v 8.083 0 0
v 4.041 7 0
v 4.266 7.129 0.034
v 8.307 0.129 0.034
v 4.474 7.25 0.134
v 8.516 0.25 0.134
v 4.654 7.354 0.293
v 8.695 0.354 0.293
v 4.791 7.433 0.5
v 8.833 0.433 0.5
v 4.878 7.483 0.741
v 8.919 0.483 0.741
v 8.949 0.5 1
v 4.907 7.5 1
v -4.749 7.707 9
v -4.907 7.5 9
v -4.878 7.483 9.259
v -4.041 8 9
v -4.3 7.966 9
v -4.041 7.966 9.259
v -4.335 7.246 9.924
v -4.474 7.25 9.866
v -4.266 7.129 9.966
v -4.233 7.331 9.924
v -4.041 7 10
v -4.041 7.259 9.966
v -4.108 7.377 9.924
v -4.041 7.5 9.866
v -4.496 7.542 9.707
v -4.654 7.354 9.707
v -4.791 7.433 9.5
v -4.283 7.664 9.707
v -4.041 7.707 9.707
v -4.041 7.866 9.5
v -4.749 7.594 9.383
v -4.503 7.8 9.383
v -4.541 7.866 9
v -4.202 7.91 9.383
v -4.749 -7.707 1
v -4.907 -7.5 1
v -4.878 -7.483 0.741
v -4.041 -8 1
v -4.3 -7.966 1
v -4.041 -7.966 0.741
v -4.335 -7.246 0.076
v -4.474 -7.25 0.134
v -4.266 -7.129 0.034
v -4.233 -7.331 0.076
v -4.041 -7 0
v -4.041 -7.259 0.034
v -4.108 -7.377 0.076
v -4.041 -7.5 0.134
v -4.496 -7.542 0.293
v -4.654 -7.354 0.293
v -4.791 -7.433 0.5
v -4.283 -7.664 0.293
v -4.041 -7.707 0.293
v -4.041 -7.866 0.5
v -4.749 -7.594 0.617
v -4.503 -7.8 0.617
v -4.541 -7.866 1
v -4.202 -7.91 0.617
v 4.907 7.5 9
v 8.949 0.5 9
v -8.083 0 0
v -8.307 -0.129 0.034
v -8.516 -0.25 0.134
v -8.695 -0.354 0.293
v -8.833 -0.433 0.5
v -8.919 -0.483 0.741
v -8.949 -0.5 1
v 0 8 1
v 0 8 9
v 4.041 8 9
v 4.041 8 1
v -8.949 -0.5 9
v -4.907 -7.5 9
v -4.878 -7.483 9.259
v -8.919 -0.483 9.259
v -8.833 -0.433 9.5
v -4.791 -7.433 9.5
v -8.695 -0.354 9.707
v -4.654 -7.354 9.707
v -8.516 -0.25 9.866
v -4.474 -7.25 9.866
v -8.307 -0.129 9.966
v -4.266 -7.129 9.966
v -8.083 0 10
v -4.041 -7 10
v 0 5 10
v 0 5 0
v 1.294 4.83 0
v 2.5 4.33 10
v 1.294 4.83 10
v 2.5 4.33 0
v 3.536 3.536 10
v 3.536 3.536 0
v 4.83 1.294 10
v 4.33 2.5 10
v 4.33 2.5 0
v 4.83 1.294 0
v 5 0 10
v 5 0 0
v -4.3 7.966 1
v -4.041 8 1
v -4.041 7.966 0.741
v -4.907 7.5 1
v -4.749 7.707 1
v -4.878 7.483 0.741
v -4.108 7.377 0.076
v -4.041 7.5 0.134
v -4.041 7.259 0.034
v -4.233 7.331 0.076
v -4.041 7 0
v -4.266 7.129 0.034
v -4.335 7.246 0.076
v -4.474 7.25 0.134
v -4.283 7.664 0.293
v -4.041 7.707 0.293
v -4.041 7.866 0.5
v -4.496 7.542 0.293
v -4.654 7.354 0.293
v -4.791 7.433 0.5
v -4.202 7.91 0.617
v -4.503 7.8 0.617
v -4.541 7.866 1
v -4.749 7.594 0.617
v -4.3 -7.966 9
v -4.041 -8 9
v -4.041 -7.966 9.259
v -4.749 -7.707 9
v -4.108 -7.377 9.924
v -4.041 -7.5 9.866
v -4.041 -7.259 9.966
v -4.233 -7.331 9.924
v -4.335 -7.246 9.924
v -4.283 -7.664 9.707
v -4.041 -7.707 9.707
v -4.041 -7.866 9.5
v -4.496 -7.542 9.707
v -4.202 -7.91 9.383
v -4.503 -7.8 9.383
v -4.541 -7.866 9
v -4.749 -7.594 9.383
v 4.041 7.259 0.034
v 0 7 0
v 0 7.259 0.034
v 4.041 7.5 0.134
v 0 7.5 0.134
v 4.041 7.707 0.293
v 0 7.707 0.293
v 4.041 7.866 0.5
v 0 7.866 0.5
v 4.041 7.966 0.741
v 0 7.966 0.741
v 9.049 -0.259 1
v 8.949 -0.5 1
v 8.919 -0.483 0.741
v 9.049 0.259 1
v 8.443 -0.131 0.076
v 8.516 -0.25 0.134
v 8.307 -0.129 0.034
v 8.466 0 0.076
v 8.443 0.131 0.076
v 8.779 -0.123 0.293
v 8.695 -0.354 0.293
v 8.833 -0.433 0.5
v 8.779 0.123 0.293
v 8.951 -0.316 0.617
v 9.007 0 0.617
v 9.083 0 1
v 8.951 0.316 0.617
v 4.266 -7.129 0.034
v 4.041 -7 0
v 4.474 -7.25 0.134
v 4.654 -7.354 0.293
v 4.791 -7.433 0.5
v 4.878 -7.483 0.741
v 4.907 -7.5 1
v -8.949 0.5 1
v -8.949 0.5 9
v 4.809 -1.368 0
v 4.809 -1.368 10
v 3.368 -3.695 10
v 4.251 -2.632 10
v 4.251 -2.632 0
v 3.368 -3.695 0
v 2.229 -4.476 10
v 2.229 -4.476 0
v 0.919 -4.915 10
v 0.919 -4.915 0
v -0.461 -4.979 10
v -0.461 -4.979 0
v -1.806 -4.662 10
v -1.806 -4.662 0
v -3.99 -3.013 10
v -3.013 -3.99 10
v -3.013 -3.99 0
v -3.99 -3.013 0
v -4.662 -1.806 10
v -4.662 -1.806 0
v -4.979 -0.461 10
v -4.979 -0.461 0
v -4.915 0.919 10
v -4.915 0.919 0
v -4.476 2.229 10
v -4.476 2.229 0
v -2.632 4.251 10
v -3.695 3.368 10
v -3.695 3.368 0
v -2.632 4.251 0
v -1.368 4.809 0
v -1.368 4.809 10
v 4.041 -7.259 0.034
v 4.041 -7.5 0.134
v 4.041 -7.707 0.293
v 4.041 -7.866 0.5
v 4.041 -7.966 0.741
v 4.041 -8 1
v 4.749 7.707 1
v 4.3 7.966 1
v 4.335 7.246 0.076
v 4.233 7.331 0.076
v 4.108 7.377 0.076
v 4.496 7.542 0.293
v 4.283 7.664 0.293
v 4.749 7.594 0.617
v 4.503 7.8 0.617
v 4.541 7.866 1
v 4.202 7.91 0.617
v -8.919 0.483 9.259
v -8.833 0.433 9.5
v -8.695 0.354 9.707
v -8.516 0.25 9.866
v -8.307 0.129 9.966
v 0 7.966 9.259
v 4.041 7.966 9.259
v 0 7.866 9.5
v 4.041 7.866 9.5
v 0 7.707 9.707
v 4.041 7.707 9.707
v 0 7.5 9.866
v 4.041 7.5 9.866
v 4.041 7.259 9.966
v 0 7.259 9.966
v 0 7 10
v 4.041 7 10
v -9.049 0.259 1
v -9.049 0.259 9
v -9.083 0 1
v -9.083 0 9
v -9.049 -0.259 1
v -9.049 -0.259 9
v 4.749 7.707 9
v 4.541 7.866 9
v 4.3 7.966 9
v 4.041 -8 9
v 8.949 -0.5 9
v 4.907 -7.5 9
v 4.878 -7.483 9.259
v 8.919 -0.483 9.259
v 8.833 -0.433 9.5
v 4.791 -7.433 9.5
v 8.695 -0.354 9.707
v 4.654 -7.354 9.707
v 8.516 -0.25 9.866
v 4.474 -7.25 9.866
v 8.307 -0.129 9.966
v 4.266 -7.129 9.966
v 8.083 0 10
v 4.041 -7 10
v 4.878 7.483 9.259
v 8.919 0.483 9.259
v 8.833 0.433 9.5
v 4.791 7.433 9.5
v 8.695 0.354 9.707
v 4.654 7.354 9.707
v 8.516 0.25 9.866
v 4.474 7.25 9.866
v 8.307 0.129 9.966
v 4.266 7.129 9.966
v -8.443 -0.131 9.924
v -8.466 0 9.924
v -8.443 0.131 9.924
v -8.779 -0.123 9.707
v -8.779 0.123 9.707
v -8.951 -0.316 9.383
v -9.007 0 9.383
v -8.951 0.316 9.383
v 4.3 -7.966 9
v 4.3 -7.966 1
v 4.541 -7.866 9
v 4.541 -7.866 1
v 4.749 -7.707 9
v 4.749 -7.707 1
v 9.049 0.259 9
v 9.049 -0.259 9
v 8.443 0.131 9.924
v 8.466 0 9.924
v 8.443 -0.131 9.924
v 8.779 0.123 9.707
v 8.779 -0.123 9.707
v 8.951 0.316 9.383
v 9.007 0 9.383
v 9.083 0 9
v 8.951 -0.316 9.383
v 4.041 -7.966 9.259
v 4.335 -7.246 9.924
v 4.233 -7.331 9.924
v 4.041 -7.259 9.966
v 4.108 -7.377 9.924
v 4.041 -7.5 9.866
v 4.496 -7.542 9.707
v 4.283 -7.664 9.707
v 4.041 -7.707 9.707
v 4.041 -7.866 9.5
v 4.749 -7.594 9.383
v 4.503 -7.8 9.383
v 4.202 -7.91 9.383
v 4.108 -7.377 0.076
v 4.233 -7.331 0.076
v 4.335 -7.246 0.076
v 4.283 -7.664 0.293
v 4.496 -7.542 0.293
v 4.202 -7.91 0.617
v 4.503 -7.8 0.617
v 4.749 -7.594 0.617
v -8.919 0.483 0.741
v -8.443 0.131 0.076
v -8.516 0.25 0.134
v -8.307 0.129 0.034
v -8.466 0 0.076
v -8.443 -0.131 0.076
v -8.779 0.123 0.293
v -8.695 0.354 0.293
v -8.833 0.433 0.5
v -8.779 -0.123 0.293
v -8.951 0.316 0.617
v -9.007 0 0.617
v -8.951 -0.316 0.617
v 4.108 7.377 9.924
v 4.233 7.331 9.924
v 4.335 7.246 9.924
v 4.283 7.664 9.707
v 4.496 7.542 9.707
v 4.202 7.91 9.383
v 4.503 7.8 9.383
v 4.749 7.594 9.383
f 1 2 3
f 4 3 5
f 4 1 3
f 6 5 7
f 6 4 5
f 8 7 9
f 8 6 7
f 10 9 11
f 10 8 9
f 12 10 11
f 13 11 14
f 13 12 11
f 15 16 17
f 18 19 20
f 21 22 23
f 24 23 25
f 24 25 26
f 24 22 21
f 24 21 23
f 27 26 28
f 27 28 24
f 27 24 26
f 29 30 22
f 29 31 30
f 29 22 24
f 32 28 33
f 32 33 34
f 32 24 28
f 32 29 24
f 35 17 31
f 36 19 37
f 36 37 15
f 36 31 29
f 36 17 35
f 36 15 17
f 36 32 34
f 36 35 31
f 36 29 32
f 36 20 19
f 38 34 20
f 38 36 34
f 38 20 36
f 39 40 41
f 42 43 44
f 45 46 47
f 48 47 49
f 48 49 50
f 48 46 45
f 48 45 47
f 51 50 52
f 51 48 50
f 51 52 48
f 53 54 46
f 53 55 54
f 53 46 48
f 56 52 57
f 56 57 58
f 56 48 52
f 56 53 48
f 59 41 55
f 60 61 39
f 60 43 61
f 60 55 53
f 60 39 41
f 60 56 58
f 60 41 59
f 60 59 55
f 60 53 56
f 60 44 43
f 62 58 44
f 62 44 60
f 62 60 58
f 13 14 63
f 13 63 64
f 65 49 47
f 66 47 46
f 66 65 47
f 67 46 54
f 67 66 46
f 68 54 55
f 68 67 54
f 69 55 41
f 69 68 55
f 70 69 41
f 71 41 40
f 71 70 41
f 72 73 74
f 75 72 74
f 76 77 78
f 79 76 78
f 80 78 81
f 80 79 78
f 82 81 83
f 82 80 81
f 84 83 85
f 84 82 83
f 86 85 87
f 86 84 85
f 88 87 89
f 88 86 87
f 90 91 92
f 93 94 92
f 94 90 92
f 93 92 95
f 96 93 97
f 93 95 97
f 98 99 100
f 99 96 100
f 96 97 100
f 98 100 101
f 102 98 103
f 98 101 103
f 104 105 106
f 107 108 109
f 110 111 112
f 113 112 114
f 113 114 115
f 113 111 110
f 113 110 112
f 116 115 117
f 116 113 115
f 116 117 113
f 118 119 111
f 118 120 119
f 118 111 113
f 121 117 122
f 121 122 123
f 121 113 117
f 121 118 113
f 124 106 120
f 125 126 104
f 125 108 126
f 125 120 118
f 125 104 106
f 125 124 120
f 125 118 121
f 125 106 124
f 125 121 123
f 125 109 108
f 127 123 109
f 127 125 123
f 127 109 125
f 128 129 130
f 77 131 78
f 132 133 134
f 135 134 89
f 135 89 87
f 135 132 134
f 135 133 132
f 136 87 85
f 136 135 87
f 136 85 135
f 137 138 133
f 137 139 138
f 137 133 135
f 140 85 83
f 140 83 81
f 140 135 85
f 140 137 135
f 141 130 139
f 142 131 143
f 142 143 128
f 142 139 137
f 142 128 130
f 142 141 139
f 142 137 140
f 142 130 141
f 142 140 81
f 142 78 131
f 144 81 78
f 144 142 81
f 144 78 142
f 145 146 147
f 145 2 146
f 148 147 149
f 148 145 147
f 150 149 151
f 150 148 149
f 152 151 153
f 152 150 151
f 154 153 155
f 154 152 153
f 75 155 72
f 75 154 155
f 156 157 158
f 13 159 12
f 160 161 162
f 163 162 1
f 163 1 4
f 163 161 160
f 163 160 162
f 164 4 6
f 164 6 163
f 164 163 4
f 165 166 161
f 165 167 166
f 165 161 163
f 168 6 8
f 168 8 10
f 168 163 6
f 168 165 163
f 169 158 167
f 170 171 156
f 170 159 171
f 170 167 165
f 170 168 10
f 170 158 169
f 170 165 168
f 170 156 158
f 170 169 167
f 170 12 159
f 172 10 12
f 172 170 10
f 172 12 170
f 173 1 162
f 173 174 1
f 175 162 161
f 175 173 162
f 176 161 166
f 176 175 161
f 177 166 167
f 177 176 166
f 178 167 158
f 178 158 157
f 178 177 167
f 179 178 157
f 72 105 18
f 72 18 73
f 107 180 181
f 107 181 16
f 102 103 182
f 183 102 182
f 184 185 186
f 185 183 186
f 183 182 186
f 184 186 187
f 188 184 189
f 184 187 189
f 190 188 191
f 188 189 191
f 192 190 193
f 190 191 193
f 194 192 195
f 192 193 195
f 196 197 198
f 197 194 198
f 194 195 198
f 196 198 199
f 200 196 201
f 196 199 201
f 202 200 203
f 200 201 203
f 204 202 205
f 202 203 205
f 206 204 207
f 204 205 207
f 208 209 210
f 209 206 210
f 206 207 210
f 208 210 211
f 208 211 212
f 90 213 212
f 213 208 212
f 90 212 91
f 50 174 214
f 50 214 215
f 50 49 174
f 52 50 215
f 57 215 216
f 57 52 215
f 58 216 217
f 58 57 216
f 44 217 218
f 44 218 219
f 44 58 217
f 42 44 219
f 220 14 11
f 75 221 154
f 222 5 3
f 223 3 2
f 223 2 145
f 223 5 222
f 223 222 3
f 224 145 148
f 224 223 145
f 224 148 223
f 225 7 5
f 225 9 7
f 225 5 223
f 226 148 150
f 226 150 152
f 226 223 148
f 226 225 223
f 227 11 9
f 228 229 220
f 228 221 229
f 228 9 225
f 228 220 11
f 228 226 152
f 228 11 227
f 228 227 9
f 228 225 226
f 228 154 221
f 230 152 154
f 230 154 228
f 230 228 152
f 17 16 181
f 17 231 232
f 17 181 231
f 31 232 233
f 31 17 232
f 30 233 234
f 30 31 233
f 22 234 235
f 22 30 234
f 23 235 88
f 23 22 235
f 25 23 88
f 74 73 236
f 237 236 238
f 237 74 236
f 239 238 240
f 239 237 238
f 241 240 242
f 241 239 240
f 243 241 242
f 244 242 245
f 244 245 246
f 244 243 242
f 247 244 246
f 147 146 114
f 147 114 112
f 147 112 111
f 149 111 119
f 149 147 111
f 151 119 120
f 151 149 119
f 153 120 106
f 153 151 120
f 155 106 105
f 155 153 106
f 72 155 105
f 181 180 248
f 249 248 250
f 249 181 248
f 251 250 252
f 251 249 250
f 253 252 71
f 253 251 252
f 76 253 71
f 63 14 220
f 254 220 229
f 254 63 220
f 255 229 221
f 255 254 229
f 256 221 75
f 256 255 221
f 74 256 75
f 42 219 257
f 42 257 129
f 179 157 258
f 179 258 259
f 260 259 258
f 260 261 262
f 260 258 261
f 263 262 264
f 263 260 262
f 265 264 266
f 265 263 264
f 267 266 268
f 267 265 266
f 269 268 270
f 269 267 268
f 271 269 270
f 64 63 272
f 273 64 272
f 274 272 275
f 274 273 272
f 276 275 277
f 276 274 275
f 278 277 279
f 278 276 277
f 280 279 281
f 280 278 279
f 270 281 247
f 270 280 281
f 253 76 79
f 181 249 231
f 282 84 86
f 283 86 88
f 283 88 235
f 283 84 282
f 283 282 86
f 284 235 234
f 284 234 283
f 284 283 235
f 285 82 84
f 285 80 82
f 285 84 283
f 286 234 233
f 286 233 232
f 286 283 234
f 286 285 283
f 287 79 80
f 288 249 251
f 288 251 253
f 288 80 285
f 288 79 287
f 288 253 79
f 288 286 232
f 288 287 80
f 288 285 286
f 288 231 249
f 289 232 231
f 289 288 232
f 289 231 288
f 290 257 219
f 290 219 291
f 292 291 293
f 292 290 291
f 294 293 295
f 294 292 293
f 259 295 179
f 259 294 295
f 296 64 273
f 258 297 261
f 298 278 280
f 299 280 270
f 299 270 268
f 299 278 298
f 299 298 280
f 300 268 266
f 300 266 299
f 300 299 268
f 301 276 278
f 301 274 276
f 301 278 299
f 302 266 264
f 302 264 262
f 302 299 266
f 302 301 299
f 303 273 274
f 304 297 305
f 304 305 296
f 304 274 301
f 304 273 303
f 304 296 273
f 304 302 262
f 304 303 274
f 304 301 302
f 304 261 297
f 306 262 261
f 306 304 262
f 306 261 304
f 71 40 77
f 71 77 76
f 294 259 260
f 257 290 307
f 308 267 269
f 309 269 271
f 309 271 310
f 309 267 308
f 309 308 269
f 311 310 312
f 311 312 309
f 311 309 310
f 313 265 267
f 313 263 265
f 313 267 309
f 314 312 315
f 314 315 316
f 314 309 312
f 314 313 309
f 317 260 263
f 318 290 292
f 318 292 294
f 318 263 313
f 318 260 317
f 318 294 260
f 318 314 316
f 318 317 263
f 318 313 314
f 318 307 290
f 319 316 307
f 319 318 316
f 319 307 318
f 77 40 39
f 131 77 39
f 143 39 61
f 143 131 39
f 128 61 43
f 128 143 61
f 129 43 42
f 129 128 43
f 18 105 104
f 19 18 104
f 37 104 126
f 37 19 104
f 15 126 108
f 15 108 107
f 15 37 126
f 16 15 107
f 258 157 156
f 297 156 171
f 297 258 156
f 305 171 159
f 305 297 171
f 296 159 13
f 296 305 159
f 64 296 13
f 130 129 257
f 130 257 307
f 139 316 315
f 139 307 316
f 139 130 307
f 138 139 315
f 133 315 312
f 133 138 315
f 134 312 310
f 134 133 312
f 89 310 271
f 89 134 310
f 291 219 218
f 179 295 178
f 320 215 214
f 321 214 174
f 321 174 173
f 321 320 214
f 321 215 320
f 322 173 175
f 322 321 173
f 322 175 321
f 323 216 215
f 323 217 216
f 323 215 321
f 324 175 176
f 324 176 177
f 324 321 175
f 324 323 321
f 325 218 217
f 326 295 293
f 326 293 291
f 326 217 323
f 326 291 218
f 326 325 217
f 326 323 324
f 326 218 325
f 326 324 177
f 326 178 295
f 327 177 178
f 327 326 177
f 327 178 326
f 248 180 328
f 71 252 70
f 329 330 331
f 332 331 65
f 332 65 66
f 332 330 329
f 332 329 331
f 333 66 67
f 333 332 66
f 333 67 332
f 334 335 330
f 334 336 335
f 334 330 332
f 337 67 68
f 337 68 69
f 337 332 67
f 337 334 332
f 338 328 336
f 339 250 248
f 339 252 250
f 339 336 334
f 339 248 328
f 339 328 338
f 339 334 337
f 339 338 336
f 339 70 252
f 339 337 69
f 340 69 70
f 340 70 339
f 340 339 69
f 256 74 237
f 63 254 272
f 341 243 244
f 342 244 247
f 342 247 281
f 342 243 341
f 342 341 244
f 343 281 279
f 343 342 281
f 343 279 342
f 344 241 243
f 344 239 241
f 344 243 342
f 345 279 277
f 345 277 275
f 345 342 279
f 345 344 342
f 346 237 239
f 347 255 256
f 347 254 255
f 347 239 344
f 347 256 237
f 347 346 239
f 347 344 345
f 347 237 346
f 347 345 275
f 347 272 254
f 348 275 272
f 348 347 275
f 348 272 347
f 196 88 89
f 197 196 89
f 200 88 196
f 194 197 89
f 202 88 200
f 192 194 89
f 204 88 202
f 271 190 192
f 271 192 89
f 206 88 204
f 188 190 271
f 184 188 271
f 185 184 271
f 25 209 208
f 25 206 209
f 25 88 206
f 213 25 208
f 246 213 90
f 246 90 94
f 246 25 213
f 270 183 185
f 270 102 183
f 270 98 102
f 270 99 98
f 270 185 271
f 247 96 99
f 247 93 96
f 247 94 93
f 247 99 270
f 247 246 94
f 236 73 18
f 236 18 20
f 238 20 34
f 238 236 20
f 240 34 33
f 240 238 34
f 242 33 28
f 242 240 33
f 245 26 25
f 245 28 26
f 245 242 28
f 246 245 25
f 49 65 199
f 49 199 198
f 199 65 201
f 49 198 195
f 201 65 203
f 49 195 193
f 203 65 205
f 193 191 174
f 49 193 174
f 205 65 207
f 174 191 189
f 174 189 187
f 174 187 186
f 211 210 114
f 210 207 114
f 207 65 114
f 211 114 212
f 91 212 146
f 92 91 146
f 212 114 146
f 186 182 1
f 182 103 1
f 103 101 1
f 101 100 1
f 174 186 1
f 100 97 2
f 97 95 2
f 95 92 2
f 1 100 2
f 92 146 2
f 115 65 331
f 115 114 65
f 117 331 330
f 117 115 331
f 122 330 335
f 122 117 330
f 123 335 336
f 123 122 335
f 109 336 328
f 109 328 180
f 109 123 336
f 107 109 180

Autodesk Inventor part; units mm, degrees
ref_plane "YZ Plane" through (0, 0, 0) normal (1, 0, 0) x (0, 1, 0)
ref_plane "XZ Plane" through (0, 0, 0) normal (0, 1, 0) x (-1, 0, 0)
ref_plane "XY Plane" through (0, 0, 0) normal (0, 0, 1) x (1, 0, 0)
sketch "草图1" plane through (0, 0, 0) normal (0, 0, 1) x (1, 0, 0)
  line L0 (4.6188, -8) -> (-4.6188, -8)
  line L1 (-4.6188, -8) -> (-9.2376, 0)
  line L2 (-9.2376, 0) -> (-4.6188, 8)
  line L3 (-4.6188, 8) -> (4.6188, 8)
  line L4 (4.6188, 8) -> (9.2376, 0)
  line L5 (9.2376, 0) -> (4.6188, -8)
  line L6 (0, 0) -> (0, 8)
  circle A0 centre (0, 0) radius 5
  dimension "d0" = 16
  dimension "d1" = 10
extrude "拉伸1" add sketch "草图1" along normal blind 10
thread "螺纹1" size "M10x1.5" class "6H" standard "ANSI Metric M Profile" full length
fillet "圆角1" radius 1 20 edges at (2.3094, 8, 10) (-2.3094, 8, 10) (-6.9282, 4, 10) (-6.9282, -4, 10) (0, -8, 10) (6.9282, -4, 10) (6.9282, 4, 10) (9.2376, 0, 5) (4.6188, 8, 5) (-4.6188, 8, 5) (-9.2376, 0, 5) (-4.6188, -8, 5) (4.6188, -8, 5) (6.9282, -4, 0) (6.9282, 4, 0) (2.3094, 8, 0) (-2.3094, 8, 0) (-6.9282, 4, 0) (-6.9282, -4, 0) (0, -8, 0)
properties part number "集肉斗固定螺帽"
